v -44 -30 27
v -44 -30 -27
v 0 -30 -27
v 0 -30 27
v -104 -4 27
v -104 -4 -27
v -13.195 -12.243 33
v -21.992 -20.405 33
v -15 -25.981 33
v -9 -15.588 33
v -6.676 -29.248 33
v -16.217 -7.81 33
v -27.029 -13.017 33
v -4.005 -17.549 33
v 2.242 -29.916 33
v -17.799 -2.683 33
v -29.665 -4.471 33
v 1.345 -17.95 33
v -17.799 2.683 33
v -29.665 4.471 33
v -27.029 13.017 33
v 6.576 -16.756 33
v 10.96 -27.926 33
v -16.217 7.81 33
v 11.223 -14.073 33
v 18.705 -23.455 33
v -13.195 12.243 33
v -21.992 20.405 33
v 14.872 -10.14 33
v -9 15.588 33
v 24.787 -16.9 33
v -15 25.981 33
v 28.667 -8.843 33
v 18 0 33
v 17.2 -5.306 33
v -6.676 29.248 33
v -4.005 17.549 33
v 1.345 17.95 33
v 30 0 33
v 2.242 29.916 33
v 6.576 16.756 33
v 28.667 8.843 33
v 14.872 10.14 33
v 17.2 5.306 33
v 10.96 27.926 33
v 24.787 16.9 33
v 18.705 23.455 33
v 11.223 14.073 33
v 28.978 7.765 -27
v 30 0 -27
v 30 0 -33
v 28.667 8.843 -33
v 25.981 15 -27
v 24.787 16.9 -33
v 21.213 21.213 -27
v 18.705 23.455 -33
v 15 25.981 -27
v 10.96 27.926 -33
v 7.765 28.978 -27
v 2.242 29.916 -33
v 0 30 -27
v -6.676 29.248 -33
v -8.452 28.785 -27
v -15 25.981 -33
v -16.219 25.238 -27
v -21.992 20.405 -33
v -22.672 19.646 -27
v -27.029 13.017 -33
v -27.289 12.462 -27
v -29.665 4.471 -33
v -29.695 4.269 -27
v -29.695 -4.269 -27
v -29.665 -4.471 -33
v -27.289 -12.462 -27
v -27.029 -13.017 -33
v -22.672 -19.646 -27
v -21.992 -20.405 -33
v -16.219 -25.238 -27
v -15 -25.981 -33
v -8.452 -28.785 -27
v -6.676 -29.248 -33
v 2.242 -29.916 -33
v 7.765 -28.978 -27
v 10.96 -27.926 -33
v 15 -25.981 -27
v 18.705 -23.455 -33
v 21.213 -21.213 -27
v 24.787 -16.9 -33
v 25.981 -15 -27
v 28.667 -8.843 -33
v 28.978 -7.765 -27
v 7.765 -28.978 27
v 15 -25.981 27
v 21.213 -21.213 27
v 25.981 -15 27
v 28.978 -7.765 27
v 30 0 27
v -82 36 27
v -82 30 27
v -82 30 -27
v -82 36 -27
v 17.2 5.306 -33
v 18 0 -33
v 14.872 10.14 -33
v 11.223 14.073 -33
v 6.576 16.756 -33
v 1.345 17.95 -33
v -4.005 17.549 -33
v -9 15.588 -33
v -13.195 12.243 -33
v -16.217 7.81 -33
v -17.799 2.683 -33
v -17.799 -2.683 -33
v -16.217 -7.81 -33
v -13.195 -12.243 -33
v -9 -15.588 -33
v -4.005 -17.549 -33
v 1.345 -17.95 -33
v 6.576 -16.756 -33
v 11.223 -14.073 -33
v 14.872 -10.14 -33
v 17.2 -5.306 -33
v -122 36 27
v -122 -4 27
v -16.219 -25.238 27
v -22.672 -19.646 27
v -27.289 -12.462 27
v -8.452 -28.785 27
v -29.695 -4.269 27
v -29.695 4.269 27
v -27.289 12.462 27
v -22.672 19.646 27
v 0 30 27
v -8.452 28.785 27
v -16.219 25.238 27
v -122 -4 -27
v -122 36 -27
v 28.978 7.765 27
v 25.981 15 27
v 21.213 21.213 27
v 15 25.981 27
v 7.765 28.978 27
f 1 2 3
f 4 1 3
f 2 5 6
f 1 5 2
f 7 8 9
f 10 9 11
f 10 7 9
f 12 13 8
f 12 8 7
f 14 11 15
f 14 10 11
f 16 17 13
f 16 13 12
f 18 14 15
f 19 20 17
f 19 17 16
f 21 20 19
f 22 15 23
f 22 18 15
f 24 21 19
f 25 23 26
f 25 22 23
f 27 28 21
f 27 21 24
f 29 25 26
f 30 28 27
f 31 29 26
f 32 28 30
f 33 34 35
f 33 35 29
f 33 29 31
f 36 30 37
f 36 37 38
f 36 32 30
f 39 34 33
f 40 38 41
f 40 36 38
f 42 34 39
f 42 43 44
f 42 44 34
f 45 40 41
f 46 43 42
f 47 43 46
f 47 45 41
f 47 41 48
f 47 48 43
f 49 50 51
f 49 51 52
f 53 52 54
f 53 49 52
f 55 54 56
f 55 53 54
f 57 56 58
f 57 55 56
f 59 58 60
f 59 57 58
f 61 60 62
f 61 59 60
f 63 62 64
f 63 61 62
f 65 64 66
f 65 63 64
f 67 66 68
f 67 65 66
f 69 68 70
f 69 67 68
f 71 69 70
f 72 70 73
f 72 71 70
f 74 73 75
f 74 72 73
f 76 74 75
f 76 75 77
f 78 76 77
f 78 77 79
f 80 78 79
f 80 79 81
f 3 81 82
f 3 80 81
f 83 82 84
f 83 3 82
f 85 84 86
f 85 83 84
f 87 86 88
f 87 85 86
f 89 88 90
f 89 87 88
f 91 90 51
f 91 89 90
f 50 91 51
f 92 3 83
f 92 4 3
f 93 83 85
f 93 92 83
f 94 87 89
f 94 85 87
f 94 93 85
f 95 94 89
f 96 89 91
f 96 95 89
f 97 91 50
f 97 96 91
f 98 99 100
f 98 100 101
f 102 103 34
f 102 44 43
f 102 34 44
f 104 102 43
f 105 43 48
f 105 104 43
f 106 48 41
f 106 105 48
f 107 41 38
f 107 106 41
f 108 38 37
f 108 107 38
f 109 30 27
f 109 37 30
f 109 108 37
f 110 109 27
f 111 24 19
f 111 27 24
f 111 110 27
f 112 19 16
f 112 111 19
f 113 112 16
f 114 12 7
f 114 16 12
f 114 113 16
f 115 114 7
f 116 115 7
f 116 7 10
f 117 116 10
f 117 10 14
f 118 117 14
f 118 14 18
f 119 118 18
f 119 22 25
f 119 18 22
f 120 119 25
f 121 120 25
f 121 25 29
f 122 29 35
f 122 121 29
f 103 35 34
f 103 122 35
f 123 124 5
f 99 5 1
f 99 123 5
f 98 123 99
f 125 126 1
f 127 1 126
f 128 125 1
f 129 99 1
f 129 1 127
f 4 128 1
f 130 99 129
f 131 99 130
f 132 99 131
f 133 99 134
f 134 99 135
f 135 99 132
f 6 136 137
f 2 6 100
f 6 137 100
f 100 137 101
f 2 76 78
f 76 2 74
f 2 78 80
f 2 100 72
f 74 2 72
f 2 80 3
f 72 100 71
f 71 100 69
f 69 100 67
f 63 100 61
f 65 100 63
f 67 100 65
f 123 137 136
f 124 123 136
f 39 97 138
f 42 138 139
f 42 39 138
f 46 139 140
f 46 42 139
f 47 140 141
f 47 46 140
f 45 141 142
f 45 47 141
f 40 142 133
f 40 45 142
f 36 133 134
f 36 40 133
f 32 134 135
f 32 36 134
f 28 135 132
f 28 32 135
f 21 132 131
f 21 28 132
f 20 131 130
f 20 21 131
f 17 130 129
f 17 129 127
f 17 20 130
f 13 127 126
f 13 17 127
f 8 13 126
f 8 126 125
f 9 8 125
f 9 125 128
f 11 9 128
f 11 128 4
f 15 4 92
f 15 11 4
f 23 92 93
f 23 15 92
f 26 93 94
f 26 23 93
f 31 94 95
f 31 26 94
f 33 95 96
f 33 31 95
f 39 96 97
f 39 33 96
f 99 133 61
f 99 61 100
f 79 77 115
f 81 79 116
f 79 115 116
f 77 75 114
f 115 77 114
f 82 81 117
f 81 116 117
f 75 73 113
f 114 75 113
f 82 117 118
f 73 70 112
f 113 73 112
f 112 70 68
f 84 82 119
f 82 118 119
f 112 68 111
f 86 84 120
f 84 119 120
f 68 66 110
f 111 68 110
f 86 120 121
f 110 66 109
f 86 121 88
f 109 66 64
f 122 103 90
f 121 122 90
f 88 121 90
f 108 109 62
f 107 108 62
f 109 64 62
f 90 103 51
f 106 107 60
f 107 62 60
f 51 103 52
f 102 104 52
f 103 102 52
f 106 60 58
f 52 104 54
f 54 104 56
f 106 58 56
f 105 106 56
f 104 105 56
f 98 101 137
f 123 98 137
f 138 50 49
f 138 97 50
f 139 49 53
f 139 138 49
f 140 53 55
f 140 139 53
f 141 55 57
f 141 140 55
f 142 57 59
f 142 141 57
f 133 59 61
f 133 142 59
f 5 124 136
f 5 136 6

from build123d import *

# Parameters (mm, degrees)
BOSS_EXTRUDE1_DEPTH     = 27
SKETCH2_3_R             = 30
BOSS_EXTRUDE2_DEPTH     = 33
CUT_EXTRUDE1_DEPTH      = 66
CUT_EXTRUDE1_DEPTH_BACK = 66
SKETCH2_4_R             = 18


with BuildPart() as part:
    # Sketch2 → Boss-Extrude1 (new, symmetric)
    with BuildSketch(Plane.XY):
        with BuildLine():
            Line((-44, -30), (0, -30))
            ThreePointArc((0, -30), (30, 0), (0, 30))
            Line((0, 30), (-82, 30))
            Line((-82, 30), (-82, 36))
            Line((-82, 36), (-122, 36))
            Line((-122, 36), (-122, -4))
            Line((-122, -4), (-104, -4))
            Line((-104, -4), (-44, -30))
        make_face()
    extrude(amount=BOSS_EXTRUDE1_DEPTH, both=True)

    # Sketch2<3> → Boss-Extrude2 (add, symmetric)
    with BuildSketch(Plane.XY):
        Circle(SKETCH2_3_R)
    extrude(amount=BOSS_EXTRUDE2_DEPTH, both=True)

    # Sketch2<4> → Cut-Extrude1 (cut, two sides: drawn at the far end of the back side and taken through both)
    with BuildSketch(Plane.XY.offset(-CUT_EXTRUDE1_DEPTH_BACK)):
        Circle(SKETCH2_4_R)
    extrude(amount=CUT_EXTRUDE1_DEPTH + CUT_EXTRUDE1_DEPTH_BACK, mode=Mode.SUBTRACT)


solid = part.part
